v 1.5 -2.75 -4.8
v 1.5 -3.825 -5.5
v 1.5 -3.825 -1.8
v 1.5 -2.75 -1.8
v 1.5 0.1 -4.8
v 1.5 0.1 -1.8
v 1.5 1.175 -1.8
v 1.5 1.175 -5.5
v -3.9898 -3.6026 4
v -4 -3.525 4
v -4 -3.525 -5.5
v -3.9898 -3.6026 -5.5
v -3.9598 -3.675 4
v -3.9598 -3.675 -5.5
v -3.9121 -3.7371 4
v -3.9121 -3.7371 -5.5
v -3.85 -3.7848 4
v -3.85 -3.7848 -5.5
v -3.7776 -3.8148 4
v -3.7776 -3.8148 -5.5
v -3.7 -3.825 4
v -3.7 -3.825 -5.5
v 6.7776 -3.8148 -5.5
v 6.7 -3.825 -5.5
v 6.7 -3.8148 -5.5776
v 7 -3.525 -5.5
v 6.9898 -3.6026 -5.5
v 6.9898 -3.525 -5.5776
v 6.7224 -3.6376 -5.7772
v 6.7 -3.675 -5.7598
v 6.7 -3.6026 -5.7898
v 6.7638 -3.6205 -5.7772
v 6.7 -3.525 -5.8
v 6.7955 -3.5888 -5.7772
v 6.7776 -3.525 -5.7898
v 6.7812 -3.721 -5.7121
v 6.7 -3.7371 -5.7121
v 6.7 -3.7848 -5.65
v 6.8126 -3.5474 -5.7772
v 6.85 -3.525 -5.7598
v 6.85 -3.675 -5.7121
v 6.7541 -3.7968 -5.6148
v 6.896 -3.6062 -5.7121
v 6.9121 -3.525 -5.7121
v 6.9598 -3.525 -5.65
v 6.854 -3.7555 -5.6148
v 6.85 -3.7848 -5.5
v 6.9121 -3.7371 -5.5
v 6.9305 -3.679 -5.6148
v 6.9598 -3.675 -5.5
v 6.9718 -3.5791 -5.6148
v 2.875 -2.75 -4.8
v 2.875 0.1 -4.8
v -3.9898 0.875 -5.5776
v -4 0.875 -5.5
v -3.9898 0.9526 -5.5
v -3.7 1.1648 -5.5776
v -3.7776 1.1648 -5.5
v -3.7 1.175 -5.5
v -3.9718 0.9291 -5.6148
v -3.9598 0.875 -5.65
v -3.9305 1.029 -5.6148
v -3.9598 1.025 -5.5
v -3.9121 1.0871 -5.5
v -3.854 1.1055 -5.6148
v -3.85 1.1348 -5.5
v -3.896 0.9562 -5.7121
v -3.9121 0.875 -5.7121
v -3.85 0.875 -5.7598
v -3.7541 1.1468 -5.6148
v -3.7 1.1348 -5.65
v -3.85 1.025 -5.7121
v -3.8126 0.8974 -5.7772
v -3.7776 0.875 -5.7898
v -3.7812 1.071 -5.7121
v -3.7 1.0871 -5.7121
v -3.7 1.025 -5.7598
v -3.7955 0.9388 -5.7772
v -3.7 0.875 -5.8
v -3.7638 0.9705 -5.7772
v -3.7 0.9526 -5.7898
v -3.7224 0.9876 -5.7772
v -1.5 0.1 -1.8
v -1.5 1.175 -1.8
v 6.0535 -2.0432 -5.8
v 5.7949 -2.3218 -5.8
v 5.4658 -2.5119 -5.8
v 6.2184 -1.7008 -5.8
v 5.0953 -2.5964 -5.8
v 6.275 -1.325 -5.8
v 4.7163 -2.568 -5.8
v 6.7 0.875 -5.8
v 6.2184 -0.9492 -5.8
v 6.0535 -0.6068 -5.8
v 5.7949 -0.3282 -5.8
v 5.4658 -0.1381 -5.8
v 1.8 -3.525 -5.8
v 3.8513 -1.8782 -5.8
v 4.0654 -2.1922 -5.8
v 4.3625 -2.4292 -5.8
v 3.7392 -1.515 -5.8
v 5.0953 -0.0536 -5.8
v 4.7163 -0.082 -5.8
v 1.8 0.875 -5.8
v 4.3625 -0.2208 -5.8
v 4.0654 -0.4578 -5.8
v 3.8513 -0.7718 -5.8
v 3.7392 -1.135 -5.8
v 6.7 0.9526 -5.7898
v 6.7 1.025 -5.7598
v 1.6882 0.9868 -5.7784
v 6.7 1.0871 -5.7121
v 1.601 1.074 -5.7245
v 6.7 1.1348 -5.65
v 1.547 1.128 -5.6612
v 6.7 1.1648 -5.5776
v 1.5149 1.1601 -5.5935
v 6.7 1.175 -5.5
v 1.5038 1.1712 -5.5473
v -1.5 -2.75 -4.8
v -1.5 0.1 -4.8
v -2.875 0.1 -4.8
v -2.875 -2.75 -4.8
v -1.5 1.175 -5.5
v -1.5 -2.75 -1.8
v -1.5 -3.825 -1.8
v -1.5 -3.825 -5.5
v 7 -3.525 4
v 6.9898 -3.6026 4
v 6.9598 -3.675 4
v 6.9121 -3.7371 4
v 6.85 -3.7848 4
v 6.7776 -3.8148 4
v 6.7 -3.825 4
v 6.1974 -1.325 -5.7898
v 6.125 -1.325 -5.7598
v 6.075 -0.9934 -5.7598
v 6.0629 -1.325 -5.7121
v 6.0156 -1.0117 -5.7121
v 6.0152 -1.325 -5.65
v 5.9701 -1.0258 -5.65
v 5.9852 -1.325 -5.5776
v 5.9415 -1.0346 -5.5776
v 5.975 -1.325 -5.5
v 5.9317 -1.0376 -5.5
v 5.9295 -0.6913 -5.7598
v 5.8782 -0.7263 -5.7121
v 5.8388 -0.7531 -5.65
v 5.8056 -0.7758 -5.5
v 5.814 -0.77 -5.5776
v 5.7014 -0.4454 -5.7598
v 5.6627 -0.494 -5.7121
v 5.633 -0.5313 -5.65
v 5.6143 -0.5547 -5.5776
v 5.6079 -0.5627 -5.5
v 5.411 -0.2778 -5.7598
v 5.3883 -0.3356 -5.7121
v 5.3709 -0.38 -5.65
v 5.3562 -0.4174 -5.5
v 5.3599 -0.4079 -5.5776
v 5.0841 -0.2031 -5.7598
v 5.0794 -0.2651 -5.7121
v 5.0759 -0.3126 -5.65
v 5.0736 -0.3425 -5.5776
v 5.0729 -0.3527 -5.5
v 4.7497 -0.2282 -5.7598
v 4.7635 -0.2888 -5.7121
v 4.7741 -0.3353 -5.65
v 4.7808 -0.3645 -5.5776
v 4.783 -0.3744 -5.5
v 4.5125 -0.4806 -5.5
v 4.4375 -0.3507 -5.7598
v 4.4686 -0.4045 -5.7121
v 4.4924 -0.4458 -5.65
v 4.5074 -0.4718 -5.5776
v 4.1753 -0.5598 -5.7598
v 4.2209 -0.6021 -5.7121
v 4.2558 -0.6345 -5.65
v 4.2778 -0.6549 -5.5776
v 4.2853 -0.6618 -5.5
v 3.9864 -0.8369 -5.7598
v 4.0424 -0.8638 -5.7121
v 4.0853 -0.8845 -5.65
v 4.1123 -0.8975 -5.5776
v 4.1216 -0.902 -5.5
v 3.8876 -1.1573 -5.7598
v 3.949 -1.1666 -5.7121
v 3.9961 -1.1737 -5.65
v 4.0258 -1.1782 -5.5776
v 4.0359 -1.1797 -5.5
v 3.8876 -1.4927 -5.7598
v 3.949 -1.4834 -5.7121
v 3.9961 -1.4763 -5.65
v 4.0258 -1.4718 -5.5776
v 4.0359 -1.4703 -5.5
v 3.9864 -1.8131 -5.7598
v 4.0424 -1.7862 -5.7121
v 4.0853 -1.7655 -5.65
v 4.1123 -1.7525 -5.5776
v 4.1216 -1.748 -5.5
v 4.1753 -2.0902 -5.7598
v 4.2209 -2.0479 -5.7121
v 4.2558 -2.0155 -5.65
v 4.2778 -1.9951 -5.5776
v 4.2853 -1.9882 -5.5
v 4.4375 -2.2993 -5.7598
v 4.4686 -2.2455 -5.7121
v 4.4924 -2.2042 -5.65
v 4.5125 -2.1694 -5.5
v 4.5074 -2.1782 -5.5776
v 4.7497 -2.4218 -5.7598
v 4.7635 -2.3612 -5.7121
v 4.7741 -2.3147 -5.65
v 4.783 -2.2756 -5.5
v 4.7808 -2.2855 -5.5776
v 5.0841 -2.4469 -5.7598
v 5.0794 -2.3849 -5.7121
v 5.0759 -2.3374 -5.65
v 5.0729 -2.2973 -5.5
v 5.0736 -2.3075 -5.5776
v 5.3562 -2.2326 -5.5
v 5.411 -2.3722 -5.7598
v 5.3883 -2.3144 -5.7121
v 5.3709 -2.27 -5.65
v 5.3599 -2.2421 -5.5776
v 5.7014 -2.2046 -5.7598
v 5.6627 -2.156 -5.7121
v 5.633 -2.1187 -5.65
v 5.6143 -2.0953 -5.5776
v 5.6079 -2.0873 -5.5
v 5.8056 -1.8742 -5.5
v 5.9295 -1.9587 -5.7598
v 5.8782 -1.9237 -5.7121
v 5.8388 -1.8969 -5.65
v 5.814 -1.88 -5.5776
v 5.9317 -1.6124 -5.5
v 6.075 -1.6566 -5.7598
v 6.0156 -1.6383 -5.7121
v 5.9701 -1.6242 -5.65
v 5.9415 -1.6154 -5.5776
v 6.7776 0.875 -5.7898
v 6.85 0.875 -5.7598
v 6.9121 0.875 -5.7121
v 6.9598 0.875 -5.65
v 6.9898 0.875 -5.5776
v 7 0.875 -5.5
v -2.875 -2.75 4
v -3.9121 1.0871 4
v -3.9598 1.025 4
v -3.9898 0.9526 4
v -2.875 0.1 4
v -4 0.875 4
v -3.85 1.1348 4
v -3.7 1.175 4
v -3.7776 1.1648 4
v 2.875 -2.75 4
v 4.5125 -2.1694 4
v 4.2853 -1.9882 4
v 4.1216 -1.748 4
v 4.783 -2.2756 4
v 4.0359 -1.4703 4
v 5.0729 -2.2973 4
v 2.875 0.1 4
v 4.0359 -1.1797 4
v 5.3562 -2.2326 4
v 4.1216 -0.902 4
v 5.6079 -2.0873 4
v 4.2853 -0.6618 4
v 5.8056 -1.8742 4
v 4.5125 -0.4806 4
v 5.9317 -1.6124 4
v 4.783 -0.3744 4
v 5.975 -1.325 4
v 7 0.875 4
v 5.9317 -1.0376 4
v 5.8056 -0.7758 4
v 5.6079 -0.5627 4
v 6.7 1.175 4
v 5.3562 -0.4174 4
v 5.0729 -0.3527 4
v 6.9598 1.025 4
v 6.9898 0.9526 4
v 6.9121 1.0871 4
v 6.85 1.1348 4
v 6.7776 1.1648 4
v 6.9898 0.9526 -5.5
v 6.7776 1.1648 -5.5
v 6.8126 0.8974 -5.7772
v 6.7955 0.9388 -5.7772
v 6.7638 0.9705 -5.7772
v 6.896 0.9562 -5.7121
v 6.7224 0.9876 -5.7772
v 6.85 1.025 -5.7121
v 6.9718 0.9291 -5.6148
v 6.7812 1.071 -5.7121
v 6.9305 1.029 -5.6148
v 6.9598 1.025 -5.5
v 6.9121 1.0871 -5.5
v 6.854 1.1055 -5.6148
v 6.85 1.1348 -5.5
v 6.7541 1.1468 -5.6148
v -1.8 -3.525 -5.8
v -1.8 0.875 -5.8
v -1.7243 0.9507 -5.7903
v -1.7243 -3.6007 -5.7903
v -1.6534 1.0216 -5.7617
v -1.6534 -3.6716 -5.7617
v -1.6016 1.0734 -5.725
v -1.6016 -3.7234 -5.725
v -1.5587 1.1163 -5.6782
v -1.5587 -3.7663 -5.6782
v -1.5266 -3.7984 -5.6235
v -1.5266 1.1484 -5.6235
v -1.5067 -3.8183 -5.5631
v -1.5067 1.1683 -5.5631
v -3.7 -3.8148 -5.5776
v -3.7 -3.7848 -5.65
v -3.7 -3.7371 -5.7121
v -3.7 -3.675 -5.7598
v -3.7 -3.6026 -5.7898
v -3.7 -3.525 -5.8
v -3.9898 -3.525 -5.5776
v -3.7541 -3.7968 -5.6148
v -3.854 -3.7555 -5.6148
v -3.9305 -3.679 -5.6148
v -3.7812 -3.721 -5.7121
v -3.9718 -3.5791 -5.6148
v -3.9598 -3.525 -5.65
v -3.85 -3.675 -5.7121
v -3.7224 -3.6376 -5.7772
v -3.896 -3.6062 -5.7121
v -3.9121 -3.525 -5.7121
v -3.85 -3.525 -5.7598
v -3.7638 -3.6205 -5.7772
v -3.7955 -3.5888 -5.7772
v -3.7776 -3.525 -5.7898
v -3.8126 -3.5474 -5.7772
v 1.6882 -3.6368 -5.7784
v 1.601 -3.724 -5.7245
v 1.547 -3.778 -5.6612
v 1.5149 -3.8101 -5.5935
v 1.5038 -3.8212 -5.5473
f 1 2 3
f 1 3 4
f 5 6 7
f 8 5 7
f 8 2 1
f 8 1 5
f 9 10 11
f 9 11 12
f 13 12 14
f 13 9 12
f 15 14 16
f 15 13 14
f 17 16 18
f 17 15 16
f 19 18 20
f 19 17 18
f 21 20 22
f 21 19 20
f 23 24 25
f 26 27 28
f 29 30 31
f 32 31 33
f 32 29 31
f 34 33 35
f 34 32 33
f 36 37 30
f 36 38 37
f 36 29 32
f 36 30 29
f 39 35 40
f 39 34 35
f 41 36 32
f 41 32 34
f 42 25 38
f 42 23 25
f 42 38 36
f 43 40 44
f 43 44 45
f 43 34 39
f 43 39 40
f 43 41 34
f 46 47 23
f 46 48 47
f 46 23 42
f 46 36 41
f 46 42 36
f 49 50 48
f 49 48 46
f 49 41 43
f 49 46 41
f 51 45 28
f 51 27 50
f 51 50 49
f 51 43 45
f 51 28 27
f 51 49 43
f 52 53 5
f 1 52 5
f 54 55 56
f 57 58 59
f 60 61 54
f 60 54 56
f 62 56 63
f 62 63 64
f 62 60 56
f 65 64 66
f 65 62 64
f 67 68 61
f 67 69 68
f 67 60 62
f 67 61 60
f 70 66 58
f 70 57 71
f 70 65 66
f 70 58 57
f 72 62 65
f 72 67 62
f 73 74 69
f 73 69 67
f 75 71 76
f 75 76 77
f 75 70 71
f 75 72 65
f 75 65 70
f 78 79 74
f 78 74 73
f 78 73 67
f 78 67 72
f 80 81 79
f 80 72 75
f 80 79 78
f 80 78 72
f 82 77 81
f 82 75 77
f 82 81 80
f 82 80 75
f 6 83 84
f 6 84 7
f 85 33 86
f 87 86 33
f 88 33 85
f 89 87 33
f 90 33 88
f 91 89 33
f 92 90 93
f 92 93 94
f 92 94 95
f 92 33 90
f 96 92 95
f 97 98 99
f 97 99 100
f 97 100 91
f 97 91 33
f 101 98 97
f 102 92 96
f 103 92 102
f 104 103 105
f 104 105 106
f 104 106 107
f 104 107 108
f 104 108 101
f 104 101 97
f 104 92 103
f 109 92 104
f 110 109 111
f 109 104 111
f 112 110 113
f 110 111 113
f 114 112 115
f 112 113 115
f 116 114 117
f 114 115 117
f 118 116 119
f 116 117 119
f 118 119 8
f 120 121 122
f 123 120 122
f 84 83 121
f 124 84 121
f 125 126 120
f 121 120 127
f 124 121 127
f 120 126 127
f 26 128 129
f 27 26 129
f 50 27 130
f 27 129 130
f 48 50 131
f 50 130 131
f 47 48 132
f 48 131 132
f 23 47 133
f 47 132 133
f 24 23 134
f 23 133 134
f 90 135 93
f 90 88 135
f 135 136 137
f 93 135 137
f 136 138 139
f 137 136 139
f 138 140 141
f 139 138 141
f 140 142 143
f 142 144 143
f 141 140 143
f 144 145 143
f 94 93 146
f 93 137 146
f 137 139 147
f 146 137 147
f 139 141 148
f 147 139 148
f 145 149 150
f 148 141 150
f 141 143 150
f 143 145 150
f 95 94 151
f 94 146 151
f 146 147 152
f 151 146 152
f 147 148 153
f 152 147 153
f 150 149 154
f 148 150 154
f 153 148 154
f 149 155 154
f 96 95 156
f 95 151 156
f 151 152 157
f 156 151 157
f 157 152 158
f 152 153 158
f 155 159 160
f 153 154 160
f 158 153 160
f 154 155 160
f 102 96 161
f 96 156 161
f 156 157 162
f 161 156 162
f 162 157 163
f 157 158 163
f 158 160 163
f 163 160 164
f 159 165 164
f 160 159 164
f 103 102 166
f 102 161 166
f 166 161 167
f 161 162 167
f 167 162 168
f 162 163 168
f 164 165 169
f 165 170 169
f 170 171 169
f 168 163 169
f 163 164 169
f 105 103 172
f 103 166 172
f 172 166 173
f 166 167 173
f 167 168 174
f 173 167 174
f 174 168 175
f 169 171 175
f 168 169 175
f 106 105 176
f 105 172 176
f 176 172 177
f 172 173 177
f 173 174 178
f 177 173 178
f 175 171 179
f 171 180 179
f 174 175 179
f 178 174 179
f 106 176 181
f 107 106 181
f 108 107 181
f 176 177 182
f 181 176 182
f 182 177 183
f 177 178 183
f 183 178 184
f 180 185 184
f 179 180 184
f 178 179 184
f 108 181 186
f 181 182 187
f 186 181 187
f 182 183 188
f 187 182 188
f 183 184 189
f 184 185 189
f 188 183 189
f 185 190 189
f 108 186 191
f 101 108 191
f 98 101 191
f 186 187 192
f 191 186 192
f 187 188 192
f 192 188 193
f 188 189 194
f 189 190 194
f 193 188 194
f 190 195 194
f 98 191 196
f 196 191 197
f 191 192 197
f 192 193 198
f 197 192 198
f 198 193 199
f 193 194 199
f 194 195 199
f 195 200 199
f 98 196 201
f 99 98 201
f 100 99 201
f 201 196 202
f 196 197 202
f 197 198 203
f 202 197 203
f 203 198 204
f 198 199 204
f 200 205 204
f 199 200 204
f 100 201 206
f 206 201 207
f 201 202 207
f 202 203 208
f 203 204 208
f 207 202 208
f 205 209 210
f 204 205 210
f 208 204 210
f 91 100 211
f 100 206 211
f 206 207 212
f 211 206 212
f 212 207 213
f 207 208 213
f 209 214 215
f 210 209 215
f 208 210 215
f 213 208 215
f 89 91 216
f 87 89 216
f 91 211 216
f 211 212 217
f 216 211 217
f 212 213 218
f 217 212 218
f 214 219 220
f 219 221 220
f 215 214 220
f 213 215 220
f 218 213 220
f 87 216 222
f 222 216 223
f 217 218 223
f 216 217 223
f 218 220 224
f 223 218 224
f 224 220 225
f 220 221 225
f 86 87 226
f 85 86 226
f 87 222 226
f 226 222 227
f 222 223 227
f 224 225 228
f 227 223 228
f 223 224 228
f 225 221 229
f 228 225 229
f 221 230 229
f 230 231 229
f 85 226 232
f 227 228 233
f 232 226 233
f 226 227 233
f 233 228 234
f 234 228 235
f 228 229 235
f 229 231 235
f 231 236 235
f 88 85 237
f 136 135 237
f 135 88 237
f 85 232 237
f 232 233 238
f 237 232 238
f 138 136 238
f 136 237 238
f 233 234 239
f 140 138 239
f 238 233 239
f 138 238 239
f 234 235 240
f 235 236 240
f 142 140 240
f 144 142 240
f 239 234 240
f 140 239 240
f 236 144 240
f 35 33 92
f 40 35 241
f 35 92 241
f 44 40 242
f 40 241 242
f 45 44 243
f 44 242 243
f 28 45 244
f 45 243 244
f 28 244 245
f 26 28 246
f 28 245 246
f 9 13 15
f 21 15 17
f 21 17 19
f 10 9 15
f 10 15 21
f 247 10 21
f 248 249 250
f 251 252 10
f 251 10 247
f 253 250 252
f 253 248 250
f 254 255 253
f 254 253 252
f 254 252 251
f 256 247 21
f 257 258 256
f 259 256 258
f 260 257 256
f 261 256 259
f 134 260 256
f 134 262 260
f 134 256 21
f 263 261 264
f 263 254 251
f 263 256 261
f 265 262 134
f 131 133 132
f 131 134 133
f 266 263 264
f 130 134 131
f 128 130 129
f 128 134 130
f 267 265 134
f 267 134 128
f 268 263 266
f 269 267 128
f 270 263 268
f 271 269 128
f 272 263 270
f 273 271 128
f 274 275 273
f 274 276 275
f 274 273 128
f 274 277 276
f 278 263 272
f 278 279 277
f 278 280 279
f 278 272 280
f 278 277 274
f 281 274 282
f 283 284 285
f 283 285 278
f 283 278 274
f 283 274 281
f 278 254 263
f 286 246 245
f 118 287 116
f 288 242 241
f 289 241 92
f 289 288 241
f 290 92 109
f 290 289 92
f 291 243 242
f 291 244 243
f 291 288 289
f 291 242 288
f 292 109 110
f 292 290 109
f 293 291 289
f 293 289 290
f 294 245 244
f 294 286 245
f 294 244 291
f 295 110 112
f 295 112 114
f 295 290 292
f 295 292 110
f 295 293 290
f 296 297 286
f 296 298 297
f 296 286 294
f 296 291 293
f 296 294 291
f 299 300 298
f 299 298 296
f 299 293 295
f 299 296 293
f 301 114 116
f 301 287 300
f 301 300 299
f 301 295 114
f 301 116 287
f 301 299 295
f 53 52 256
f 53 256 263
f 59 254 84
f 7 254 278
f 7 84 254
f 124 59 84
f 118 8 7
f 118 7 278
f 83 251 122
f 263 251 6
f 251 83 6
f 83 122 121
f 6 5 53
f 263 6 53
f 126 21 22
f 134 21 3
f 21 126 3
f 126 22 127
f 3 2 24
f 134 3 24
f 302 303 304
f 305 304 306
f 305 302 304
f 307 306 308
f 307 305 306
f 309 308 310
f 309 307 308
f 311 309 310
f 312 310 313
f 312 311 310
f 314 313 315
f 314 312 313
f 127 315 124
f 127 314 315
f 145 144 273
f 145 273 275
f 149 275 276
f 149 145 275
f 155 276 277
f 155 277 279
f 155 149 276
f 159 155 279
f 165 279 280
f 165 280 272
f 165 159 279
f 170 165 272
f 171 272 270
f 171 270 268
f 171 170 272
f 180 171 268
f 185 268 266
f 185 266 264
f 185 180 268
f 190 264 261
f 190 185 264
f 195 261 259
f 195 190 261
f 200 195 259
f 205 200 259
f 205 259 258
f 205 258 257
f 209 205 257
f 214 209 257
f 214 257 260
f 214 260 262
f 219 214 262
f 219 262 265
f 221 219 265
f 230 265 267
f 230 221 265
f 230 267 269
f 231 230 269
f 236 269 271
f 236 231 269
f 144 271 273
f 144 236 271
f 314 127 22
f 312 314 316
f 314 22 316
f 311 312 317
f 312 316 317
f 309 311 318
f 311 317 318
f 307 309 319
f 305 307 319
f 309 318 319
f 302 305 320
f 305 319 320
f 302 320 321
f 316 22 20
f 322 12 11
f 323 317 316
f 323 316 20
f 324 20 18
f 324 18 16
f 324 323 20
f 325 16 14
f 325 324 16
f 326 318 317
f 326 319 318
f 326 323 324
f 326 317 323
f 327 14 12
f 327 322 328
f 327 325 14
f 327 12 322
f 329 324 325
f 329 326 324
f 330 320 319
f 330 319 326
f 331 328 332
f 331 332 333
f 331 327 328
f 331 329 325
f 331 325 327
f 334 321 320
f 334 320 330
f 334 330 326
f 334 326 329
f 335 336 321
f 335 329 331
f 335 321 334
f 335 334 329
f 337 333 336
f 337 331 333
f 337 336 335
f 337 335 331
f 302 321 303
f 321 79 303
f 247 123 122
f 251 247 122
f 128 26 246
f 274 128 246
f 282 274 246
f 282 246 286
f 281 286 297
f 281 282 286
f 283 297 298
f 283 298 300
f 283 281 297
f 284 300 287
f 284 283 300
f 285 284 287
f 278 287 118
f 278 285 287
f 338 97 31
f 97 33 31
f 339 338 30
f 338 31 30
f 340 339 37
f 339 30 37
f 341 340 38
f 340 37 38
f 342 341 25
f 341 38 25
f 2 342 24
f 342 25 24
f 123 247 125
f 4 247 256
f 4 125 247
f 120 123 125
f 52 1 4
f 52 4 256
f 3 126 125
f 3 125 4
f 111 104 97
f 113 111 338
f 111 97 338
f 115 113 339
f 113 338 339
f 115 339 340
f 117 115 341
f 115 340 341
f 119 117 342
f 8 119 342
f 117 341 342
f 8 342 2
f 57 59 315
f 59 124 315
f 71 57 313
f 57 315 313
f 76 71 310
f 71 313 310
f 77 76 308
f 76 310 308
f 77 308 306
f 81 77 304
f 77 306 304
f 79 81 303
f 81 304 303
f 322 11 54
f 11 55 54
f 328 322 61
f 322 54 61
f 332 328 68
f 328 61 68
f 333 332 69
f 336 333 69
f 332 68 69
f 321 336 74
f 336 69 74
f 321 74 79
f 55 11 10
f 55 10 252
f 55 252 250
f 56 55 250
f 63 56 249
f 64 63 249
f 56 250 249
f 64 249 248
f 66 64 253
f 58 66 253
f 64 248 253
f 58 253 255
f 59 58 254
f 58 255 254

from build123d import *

# Parameters (mm, degrees)
BOSS_EXTRUDE1_DEPTH      = 4
BOSS_EXTRUDE1_DEPTH_BACK = 5.8
SKETCH1_W                = 11
SKETCH1_H                = 5
SKETCH1_R                = 0.975
SKETCH1_W_2              = 5.75
SKETCH1_H_2              = 2.85
CUT_EXTRUDE1_DEPTH       = 10.901799079
CUT_EXTRUDE1_DEPTH_BACK  = 10.901799079
SKETCH3_W                = 3
SKETCH3_H                = 4
SKETCH4_W                = 1.375
SKETCH4_H                = 2.85
BOSS_EXTRUDE3_DEPTH      = 1
FILLET1_R                = 0.3
FILLET2_R                = 0.3


with BuildPart() as part:
    # Sketch1 → Boss-Extrude1 (new, two sides: drawn at the far end of the back side and taken through both)
    with BuildSketch(Plane.XY.offset(-BOSS_EXTRUDE1_DEPTH_BACK)):
        with Locations((1.5, -1.325)):
            Rectangle(SKETCH1_W, SKETCH1_H)
        with Locations((5, -1.325)):
            Circle(SKETCH1_R, mode=Mode.SUBTRACT)
        with Locations((0, -1.325)):
            Rectangle(SKETCH1_W_2, SKETCH1_H_2, mode=Mode.SUBTRACT)
    extrude(amount=BOSS_EXTRUDE1_DEPTH + BOSS_EXTRUDE1_DEPTH_BACK)

    # Sketch3 → Cut-Extrude1 (cut, two sides: drawn at the far end of the back side and taken through both)
    with BuildSketch(Plane(origin=(0, -2.75, 0), x_dir=(1, 0, 0), z_dir=(0, 1, 0)).offset(-CUT_EXTRUDE1_DEPTH_BACK)):
        with Locations((0, 3.8)):
            Rectangle(SKETCH3_W, SKETCH3_H)
    extrude(amount=CUT_EXTRUDE1_DEPTH + CUT_EXTRUDE1_DEPTH_BACK, mode=Mode.SUBTRACT)

    # Sketch4 → Boss-Extrude3 (add)
    with BuildSketch(Plane(origin=(0, 0, -5.8), x_dir=(-1, 0, 0), z_dir=(0, 0, -1))):
        with Locations((-2.1875, -1.325)):
            Rectangle(SKETCH4_W, SKETCH4_H)
        with Locations((2.1875, -1.325)):
            Rectangle(SKETCH4_W, SKETCH4_H)
    extrude(amount=-BOSS_EXTRUDE3_DEPTH)

    # Fillet1
    fillet1_edges = [part.edges().sort_by_distance(p)[0] for p in [
        (-4, 1.175, -0.9),
        (7, 1.175, -0.9),
        (7, -3.825, -0.9),
        (-4, -3.825, -0.9),
    ]]
    fillet(fillet1_edges, radius=FILLET1_R)

    # Fillet2
    fillet2_edges = [part.edges().sort_by_distance(p)[0] for p in [
        (-2.6, 1.175, -5.8),
        (4.1, -3.825, -5.8),
        (7, -1.325, -5.8),
        (6.912132034, -3.737132034, -5.8),
        (6.912132034, 1.087132034, -5.8),
        (-4, -1.325, -5.8),
        (-3.912132034, 1.087132034, -5.8),
        (-3.912132034, -3.737132034, -5.8),
        (4.025, -1.325, -5.8),
        (4.1, 1.175, -5.8),
        (-2.6, -3.825, -5.8),
        (1.5, -1.325, -5.8),
        (-1.5, -1.325, -5.8),
    ]]
    fillet(fillet2_edges, radius=FILLET2_R)


solid = part.part
